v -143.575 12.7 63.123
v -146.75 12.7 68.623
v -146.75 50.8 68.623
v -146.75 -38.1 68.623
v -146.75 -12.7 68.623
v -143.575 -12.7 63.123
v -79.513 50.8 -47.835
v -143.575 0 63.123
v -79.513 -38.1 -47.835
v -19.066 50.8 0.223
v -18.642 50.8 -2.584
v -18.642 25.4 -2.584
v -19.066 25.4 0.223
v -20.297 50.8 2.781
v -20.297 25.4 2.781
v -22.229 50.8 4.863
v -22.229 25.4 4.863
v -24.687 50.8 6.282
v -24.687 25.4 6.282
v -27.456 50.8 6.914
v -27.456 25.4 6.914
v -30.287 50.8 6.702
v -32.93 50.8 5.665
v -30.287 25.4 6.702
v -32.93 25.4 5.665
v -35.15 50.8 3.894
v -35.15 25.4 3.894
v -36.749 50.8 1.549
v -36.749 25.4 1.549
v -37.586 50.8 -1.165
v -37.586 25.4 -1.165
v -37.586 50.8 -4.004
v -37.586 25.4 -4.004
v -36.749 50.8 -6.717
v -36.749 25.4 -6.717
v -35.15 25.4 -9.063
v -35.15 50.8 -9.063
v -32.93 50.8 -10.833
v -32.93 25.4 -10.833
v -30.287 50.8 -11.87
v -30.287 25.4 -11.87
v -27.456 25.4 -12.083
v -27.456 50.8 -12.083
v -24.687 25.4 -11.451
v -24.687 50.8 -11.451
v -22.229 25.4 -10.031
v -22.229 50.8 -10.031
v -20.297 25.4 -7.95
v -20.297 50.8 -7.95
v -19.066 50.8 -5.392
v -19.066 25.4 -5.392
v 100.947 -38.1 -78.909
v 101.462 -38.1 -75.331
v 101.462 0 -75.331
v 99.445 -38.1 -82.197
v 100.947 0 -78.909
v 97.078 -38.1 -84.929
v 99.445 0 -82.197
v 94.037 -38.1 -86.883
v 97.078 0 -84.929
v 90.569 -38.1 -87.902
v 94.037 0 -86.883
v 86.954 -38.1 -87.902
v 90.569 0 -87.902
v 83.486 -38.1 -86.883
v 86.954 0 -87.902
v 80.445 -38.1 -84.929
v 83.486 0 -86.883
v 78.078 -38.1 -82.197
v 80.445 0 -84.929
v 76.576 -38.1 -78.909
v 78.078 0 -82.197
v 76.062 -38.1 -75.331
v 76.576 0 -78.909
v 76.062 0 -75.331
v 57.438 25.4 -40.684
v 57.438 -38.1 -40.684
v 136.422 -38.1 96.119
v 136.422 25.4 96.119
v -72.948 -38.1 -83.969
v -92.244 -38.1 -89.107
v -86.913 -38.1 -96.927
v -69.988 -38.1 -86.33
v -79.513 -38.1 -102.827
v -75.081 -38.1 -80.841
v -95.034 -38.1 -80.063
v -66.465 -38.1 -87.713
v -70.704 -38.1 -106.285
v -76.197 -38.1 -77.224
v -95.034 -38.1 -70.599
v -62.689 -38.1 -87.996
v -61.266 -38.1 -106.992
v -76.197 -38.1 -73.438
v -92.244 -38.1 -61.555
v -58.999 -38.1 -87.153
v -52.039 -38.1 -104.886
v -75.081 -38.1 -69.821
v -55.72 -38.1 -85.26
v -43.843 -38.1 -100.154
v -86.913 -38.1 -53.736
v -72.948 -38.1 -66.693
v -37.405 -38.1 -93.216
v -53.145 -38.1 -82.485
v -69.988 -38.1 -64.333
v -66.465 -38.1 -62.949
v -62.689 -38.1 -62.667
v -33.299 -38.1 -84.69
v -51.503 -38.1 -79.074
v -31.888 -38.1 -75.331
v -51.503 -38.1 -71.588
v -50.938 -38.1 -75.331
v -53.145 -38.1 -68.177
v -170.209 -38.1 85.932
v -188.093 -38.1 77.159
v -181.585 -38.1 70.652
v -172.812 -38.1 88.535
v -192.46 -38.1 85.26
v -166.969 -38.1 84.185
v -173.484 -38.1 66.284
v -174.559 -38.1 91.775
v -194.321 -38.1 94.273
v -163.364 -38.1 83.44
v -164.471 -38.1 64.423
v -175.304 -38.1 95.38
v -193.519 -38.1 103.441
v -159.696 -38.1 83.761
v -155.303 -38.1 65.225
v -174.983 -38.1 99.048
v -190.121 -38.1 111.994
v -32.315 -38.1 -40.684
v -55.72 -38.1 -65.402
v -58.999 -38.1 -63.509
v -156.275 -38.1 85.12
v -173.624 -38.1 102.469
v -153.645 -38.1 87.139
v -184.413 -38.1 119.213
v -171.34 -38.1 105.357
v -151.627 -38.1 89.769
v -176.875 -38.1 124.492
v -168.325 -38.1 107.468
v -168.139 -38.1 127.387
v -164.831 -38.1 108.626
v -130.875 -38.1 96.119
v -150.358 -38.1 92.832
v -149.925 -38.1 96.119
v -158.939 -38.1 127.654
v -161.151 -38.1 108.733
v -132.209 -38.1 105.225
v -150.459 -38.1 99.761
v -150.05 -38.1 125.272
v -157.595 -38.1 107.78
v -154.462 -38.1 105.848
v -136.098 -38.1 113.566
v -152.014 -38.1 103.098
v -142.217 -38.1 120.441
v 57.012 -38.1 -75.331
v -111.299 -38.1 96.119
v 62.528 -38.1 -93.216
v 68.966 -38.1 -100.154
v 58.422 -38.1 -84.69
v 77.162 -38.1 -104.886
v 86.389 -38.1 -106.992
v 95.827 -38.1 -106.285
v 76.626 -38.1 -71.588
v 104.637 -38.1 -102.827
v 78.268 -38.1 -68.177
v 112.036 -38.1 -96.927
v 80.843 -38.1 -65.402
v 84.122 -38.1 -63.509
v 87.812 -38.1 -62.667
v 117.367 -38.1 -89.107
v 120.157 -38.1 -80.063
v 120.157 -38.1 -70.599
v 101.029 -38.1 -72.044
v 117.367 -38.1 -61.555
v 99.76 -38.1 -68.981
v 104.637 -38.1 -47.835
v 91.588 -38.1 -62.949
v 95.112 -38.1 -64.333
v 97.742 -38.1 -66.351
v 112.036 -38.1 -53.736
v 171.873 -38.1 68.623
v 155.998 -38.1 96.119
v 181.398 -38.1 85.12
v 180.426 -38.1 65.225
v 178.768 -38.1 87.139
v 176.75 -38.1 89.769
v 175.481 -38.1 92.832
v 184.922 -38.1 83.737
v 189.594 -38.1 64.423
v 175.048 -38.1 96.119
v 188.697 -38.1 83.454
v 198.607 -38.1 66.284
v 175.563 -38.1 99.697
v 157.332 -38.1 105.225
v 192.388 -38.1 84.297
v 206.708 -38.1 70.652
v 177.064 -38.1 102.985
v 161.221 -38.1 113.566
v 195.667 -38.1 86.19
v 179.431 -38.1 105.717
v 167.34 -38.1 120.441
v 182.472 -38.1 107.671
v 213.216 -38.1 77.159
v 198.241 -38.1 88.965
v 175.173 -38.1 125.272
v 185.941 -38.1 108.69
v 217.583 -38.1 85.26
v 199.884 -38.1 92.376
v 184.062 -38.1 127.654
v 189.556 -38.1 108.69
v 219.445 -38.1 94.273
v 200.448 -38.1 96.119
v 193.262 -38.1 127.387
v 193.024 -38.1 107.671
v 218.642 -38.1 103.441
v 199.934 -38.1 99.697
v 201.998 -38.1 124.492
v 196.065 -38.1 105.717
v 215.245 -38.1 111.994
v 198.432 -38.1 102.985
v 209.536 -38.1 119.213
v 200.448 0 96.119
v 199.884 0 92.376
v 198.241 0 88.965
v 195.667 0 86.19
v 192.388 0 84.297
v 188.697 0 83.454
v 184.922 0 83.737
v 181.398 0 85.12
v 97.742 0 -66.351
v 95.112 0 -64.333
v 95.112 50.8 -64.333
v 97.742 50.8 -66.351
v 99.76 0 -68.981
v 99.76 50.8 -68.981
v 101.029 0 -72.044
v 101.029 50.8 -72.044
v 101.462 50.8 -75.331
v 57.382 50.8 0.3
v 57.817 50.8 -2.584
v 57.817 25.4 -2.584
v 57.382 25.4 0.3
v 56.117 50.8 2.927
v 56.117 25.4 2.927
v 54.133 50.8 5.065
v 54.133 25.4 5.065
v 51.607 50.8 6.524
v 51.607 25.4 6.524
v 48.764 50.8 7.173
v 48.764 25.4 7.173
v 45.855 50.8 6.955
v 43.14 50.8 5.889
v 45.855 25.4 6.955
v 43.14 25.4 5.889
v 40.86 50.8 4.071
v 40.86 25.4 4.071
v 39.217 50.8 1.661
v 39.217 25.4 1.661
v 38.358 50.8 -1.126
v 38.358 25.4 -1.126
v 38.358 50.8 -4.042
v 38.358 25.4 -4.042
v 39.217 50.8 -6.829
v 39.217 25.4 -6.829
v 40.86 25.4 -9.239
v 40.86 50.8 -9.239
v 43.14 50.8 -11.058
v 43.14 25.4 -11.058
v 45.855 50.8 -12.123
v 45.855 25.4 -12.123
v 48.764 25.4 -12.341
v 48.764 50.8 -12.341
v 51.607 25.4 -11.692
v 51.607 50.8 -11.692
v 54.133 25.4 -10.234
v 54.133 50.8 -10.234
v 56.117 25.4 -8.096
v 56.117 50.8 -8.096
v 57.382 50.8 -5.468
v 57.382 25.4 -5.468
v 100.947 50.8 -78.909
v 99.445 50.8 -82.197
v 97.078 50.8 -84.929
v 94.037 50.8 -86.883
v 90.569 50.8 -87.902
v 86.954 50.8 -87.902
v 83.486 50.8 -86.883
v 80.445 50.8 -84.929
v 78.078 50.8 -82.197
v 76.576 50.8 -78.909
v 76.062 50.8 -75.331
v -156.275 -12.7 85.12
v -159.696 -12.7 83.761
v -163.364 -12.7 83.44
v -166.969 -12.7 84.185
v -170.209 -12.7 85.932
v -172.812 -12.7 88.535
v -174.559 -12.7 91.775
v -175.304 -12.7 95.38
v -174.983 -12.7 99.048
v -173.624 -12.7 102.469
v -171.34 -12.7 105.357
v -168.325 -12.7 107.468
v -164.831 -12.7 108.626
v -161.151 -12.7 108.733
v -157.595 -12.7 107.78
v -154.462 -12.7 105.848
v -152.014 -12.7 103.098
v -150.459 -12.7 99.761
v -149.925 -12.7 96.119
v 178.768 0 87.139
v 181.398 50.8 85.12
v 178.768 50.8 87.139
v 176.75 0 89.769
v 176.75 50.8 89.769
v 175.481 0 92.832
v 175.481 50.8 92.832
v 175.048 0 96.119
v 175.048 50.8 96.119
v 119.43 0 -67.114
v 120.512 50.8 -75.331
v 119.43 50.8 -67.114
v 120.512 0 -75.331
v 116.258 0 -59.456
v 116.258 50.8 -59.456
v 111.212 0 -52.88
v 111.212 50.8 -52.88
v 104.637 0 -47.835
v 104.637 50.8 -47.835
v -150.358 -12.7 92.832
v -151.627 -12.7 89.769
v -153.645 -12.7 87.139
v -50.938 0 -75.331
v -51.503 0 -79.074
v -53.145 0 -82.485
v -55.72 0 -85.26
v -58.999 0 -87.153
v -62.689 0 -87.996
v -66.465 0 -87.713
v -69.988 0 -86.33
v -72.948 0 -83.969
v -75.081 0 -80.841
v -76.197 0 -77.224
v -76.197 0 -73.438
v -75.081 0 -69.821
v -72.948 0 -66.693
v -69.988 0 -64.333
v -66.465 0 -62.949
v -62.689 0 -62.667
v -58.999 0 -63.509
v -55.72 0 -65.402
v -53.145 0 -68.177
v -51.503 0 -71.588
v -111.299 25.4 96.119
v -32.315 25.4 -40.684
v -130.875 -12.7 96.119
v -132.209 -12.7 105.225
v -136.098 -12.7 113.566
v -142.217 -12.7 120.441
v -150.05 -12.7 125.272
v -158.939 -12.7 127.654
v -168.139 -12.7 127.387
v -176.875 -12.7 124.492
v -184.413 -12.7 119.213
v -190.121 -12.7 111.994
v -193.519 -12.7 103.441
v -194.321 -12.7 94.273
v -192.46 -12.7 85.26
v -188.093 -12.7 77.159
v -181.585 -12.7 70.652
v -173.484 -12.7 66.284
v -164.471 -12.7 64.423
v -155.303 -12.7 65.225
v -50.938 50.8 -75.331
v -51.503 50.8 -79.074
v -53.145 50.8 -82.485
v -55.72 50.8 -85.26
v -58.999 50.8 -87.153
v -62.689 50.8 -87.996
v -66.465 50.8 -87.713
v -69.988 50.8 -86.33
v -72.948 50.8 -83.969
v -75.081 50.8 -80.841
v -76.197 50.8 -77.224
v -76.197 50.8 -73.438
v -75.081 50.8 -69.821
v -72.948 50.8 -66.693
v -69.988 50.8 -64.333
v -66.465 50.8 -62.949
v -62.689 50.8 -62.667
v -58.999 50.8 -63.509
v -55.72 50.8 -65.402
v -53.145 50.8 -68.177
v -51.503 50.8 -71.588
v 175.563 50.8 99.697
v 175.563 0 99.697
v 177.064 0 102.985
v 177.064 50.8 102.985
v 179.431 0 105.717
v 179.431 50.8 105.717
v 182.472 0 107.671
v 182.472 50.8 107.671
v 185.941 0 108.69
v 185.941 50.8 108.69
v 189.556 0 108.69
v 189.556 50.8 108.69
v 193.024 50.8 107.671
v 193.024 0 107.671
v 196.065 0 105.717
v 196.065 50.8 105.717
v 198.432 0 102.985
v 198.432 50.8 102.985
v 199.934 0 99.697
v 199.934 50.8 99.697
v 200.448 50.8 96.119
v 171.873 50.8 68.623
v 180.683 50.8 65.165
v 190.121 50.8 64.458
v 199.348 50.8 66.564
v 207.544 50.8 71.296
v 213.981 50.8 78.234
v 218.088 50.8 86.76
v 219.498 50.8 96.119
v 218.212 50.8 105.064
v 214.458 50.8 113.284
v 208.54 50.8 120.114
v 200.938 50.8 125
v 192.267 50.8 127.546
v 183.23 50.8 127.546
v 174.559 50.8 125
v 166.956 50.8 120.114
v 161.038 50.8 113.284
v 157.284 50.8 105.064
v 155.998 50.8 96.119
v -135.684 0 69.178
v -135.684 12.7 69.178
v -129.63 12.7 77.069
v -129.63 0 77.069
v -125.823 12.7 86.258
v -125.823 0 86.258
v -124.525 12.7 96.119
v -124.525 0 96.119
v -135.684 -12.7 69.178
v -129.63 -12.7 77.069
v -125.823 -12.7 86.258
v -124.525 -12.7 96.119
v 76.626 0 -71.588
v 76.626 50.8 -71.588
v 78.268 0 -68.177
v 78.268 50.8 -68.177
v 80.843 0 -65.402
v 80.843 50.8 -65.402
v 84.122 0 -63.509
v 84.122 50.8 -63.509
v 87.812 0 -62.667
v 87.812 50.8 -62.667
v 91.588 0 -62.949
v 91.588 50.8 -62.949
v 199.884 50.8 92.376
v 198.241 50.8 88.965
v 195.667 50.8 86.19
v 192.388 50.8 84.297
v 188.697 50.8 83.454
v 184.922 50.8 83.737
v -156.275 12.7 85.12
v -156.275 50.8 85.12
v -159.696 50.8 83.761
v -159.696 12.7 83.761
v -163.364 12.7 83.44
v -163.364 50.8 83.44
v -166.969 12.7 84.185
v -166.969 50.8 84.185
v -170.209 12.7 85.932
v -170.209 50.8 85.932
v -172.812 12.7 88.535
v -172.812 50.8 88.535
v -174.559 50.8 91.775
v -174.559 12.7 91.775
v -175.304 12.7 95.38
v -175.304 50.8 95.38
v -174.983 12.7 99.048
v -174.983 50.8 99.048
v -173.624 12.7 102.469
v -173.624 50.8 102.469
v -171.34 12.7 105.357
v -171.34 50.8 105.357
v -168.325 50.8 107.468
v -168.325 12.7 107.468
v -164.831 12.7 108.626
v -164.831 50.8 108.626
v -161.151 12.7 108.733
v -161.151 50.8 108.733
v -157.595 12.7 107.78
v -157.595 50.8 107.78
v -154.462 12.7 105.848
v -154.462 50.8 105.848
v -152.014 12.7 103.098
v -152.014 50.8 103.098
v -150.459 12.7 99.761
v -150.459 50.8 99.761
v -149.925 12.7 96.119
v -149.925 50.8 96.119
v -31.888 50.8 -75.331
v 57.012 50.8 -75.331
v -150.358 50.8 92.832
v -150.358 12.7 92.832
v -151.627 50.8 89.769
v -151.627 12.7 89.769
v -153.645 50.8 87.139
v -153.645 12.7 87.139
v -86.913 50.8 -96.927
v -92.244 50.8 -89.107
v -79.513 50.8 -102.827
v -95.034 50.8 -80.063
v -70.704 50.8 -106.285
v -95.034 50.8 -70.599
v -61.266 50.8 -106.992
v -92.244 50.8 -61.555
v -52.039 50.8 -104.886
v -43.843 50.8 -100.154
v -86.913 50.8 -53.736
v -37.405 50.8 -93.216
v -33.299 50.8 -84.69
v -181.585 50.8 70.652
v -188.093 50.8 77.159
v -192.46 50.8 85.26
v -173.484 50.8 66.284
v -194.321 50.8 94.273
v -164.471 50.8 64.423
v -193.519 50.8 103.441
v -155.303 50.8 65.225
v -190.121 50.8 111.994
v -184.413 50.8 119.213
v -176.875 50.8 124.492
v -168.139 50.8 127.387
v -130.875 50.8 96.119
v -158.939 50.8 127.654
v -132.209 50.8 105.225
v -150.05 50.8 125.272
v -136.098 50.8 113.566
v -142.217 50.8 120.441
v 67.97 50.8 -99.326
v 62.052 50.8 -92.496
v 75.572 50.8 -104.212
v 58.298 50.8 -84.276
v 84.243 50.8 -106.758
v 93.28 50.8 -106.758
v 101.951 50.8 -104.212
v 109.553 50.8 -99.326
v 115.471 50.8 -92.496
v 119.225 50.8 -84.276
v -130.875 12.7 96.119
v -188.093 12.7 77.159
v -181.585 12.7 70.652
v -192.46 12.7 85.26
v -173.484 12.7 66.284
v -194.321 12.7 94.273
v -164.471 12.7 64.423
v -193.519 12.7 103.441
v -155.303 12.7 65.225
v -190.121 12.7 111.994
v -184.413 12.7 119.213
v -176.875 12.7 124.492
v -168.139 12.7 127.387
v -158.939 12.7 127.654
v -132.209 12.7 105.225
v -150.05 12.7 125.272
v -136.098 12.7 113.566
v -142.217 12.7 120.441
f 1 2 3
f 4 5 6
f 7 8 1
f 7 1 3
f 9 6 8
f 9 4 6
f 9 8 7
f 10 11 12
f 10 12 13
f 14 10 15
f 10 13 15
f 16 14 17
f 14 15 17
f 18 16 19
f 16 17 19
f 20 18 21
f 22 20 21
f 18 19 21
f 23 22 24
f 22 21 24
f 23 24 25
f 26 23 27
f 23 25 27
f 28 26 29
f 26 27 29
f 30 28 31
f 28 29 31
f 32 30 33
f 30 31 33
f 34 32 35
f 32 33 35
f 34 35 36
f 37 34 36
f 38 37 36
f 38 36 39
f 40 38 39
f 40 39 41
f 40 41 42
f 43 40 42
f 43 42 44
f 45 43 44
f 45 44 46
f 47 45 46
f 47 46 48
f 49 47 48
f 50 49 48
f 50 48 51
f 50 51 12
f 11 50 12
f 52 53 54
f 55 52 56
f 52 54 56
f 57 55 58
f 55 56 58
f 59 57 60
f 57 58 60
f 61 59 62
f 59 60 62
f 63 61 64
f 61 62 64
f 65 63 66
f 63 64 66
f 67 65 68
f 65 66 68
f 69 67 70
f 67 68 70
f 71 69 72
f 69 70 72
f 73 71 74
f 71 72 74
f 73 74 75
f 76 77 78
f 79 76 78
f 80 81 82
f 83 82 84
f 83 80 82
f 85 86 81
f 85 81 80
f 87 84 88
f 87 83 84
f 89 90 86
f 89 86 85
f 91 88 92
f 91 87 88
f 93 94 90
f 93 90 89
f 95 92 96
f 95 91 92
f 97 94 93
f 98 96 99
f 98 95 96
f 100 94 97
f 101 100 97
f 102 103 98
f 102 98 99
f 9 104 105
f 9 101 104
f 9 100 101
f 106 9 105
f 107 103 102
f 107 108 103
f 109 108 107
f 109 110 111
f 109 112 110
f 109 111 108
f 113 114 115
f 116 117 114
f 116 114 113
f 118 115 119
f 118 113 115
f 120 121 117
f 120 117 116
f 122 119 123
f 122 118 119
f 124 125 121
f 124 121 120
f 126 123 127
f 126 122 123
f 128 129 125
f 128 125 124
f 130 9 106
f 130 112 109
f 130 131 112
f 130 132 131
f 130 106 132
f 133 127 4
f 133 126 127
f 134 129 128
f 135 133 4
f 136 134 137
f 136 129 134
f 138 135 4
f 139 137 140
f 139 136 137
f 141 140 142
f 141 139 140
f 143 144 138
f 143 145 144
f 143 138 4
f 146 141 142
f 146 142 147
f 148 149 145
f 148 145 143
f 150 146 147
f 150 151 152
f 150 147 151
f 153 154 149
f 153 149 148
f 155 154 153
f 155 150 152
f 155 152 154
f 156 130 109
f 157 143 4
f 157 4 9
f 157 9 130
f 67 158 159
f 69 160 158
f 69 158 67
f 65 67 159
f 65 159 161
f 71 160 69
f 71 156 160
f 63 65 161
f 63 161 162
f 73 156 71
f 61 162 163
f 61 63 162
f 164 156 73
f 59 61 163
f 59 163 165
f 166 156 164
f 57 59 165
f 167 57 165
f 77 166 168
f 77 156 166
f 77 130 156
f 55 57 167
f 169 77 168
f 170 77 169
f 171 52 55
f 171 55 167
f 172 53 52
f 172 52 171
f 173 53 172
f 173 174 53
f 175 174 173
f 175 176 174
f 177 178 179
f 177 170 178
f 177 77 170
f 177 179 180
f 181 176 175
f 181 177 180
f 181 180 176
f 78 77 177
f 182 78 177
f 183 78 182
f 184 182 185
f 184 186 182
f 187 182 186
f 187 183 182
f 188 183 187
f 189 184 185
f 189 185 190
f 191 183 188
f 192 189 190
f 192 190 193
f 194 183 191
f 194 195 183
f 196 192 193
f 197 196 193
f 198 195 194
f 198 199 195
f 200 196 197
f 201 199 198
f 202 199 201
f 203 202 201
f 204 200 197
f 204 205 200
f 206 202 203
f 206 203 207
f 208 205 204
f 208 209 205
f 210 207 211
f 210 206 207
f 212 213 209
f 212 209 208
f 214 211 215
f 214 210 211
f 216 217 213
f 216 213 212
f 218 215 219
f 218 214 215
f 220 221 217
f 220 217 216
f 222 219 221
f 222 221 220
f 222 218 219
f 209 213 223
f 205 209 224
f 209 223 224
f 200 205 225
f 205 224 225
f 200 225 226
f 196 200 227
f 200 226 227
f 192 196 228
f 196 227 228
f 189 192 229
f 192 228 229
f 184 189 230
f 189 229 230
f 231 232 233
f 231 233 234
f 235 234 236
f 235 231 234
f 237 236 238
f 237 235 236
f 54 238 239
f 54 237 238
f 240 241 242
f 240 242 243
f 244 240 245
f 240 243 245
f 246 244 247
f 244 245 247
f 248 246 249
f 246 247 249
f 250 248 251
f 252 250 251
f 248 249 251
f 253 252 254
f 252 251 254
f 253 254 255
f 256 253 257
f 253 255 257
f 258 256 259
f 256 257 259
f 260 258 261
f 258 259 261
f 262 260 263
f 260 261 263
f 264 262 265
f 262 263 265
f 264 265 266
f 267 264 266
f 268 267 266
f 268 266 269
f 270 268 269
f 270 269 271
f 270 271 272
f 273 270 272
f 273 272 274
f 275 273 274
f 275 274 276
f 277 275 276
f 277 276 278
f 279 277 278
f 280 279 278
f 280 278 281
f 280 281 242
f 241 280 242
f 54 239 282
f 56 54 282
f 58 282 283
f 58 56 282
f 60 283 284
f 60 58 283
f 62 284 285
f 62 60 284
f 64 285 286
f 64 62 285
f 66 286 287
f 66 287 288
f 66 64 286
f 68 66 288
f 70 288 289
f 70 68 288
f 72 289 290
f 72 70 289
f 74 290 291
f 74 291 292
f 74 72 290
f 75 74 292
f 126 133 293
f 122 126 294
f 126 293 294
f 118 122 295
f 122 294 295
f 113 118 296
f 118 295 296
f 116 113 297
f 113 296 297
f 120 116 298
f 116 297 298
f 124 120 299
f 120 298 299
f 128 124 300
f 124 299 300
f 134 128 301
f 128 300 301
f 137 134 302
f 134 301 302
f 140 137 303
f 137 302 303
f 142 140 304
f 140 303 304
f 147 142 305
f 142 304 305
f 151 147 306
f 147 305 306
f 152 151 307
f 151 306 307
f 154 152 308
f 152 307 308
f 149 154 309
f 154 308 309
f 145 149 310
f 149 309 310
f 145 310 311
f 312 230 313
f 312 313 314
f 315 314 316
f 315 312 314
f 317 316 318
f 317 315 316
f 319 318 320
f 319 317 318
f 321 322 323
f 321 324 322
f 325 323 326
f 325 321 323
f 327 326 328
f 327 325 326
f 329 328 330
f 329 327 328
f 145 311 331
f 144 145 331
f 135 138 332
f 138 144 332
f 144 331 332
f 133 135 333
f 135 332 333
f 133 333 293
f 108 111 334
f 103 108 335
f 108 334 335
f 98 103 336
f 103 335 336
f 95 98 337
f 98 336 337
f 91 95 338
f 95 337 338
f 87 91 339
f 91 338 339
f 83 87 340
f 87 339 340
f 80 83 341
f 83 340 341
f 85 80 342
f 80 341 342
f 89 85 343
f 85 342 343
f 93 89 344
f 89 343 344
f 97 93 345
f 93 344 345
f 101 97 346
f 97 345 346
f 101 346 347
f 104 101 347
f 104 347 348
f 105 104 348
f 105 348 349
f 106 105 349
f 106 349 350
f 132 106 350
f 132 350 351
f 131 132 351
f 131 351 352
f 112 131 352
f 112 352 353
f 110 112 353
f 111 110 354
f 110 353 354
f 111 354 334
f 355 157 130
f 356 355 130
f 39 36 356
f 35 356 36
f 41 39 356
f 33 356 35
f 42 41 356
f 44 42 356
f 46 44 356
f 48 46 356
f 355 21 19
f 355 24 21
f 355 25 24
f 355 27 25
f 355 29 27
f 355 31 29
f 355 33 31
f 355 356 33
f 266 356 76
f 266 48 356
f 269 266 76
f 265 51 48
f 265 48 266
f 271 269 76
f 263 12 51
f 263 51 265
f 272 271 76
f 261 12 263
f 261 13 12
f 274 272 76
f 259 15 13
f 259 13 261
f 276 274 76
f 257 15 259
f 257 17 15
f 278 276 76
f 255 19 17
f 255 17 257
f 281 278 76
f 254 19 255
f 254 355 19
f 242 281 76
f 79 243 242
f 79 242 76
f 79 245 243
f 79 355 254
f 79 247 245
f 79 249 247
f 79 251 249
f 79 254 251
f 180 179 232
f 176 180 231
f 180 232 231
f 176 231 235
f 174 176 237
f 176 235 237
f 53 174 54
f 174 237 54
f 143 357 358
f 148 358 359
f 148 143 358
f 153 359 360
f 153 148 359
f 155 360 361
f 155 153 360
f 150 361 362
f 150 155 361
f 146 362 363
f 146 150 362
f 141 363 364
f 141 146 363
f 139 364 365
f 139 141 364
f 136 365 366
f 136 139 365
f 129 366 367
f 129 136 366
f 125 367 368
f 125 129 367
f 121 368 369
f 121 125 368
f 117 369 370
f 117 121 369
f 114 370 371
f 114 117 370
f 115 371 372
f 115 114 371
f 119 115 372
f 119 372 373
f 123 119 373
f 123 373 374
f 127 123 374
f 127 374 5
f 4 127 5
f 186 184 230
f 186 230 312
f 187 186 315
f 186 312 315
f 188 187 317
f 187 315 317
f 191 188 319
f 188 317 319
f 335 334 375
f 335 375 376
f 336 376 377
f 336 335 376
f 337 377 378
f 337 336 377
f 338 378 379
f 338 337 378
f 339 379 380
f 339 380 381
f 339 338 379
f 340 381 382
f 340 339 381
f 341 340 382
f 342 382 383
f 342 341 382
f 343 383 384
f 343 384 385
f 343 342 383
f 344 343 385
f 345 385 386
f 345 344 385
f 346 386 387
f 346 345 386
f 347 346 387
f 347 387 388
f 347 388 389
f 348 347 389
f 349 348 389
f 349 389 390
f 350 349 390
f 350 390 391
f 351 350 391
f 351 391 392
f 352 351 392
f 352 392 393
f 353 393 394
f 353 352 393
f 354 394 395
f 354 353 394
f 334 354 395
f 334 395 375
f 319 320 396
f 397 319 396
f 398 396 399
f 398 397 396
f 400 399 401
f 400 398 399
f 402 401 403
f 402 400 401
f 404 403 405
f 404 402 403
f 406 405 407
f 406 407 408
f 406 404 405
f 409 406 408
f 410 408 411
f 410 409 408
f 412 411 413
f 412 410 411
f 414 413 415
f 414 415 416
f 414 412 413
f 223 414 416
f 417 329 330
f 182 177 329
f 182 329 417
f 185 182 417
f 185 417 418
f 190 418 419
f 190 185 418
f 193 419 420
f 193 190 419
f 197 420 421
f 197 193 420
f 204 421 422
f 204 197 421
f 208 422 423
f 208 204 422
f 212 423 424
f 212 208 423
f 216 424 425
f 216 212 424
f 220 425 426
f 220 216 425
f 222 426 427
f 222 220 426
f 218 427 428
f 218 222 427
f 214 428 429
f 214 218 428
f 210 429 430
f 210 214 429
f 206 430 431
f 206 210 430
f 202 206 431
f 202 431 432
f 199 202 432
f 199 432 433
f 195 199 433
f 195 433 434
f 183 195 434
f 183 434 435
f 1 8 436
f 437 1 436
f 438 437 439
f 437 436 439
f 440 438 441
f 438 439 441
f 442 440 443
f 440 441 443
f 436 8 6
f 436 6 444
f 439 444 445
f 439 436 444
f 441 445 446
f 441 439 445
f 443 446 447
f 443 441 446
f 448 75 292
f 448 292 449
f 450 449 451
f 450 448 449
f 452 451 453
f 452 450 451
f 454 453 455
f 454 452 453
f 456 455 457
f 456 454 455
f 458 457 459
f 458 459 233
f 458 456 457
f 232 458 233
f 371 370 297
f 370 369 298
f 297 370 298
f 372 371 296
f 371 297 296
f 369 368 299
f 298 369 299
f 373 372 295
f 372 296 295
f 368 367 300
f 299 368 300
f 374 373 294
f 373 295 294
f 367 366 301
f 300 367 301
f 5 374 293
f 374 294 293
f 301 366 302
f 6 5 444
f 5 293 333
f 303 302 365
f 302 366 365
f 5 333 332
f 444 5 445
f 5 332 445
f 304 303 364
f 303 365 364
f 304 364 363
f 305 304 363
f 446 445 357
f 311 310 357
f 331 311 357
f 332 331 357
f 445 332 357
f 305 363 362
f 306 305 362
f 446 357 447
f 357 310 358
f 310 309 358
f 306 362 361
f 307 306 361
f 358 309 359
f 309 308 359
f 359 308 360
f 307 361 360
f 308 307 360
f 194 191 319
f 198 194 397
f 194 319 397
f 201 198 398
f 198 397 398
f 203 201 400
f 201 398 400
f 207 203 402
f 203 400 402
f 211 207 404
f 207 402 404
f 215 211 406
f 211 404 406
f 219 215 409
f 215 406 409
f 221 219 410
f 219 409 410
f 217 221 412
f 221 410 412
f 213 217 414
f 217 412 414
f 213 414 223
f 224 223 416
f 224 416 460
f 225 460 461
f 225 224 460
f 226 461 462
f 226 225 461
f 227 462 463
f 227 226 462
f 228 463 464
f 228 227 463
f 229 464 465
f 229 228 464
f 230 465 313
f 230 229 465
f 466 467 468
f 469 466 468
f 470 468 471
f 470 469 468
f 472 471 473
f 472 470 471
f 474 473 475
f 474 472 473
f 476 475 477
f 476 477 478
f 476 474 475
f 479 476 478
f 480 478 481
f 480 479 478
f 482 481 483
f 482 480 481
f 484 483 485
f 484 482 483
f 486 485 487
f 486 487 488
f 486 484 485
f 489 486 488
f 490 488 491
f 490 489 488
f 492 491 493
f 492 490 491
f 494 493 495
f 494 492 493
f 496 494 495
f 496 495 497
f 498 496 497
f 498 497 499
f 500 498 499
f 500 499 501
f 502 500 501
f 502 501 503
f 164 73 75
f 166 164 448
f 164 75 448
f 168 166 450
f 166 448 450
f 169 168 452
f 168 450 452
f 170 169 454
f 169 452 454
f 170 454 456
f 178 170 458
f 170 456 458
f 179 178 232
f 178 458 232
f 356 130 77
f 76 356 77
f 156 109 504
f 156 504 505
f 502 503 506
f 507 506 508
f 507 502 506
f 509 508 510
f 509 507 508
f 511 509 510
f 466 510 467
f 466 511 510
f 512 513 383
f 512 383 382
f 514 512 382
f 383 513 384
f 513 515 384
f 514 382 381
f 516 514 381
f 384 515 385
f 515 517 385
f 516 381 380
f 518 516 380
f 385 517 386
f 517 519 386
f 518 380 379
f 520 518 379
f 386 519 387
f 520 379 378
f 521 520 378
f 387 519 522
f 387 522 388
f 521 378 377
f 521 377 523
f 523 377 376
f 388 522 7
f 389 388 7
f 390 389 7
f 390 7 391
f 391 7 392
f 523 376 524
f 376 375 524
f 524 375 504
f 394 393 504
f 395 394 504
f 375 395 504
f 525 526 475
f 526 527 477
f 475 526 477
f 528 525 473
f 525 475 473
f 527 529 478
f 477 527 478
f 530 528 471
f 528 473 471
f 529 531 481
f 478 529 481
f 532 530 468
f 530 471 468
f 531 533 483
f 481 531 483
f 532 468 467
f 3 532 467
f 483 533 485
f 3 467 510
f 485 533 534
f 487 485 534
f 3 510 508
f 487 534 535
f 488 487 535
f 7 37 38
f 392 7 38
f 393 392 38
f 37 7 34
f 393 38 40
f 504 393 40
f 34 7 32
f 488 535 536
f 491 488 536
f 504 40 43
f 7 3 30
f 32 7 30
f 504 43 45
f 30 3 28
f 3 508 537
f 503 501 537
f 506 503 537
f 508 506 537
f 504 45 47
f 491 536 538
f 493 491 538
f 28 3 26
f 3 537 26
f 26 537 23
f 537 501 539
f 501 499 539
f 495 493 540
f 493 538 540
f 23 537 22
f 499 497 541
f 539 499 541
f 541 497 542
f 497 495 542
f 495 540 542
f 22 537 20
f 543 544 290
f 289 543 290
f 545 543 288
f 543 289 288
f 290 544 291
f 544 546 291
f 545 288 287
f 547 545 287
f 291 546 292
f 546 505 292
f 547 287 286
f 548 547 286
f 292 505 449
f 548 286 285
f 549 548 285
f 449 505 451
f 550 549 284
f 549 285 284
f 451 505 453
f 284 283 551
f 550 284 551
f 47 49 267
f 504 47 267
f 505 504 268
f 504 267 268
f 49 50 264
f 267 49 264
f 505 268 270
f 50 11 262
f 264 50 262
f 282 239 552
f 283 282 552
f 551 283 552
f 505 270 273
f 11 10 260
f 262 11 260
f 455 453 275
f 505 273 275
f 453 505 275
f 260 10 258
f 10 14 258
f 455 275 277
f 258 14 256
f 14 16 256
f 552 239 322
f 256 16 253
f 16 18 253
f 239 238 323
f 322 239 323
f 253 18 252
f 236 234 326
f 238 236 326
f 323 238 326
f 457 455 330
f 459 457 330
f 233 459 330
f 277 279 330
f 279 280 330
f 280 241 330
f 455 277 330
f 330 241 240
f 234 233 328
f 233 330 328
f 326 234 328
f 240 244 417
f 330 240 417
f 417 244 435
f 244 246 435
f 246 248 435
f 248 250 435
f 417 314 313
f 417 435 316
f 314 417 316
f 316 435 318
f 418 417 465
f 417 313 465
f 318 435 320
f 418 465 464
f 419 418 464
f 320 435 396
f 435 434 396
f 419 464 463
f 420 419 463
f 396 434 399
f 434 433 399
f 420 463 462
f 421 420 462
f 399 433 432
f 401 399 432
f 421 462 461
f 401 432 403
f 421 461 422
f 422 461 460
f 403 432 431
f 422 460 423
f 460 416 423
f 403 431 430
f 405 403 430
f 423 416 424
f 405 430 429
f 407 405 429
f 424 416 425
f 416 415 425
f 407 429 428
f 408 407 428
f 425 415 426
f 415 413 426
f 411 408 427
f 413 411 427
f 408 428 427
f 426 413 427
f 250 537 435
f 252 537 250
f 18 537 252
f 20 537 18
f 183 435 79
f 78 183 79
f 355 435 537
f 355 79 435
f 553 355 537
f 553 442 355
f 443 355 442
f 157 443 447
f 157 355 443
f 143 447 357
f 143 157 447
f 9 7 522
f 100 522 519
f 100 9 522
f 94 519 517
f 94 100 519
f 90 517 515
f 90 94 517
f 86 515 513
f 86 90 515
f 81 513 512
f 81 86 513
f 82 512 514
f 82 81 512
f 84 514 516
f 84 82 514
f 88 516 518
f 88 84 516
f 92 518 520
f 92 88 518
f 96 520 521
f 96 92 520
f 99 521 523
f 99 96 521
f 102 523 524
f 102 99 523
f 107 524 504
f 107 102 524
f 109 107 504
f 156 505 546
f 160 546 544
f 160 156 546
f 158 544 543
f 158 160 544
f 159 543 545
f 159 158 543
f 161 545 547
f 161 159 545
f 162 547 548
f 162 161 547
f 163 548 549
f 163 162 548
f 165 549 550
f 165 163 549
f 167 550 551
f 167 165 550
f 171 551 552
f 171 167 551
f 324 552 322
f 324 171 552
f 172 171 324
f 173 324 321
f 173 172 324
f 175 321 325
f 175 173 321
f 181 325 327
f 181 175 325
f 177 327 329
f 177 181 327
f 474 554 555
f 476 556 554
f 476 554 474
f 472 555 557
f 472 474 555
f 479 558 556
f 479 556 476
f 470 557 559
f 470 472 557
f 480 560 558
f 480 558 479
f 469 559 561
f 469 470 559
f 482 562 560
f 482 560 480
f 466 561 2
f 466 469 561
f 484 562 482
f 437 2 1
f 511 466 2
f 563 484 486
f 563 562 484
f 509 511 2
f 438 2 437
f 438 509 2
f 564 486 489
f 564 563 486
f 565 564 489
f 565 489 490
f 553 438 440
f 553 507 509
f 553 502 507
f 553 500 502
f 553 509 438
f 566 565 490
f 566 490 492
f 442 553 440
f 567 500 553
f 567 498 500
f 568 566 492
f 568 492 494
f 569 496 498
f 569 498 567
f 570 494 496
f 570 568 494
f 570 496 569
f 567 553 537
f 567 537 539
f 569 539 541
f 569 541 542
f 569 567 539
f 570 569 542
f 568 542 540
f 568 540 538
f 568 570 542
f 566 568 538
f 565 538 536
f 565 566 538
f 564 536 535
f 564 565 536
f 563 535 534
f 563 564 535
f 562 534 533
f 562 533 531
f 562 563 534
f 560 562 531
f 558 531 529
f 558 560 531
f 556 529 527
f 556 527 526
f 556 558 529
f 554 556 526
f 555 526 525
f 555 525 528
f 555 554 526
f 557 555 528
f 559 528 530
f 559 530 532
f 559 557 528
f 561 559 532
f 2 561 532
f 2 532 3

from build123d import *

# Parameters (mm, degrees)
F1_DEPTH  = 50.8
F3_DEPTH  = 76.2
F4_R      = 38.1
F1_FACE_R = 12.7
F5_DEPTH  = 12.7
F6_R      = 9.525
F6_R_2    = 9.7843029872
F7_DEPTH  = 25.401


with BuildPart() as f1:
    # F0 (on Front) → F1 (new body, symmetric)
    with BuildSketch(Plane.XZ):
        with BuildLine():
            ThreePointArc((-130.8751894546, 96.1189323328), (-190.1214960247, 111.9939323328), (-146.7501894546, 68.6226257627))
            Line((-146.7501894546, 68.6226257627), (-156.2751894546, 85.1204097048))
            ThreePointArc((-156.2751894546, 85.1204097048), (-173.6237120826, 102.4689323328), (-149.9251894546, 96.1189323328))
            Line((-149.9251894546, 96.1189323328), (-130.8751894546, 96.1189323328))
        make_face()
        with BuildLine():
            Line((-156.2751894546, 85.1204097048), (-146.7501894546, 68.6226257627))
            ThreePointArc((-146.7501894546, 68.6226257627), (-135.1288828844, 80.2439323328), (-130.8751894546, 96.1189323328))
            Line((-130.8751894546, 96.1189323328), (-149.9251894546, 96.1189323328))
            ThreePointArc((-149.9251894546, 96.1189323328), (-151.6266668265, 89.7689323328), (-156.2751894546, 85.1204097048))
        make_face()
        with BuildLine():
            Line((181.3982178505, 85.1204097048), (171.8732178505, 68.6226257627))
            ThreePointArc((171.8732178505, 68.6226257627), (203.6232178505, 68.6226257627), (219.4982178505, 96.1189323328))
            ThreePointArc((219.4982178505, 96.1189323328), (187.7482178505, 127.8689323328), (155.9982178505, 96.1189323328))
            Line((155.9982178505, 96.1189323328), (175.0482178505, 96.1189323328))
            ThreePointArc((175.0482178505, 96.1189323328), (187.7482178505, 108.8189323328), (200.4482178505, 96.1189323328))
            ThreePointArc((200.4482178505, 96.1189323328), (194.0982178505, 85.1204097048), (181.3982178505, 85.1204097048))
        make_face()
        with BuildLine():
            ThreePointArc((-79.513485802, -47.834761097), (-47.763485802, -47.834761097), (-31.888485802, -75.3310676672))
            Line((-31.888485802, -75.3310676672), (57.011514198, -75.3310676672))
            ThreePointArc((57.011514198, -75.3310676672), (72.886514198, -47.834761097), (104.636514198, -47.834761097))
            Line((104.636514198, -47.834761097), (171.8732178505, 68.6226257627))
            ThreePointArc((171.8732178505, 68.6226257627), (160.2519112804, 80.2439323328), (155.9982178505, 96.1189323328))
            Line((155.9982178505, 96.1189323328), (-130.8751894546, 96.1189323328))
            ThreePointArc((-130.8751894546, 96.1189323328), (-135.1288828844, 80.2439323328), (-146.7501894546, 68.6226257627))
            Line((-146.7501894546, 68.6226257627), (-79.513485802, -47.834761097))
        make_face()
        with BuildLine():
            Line((76.061514198, -75.3310676672), (57.011514198, -75.3310676672))
            ThreePointArc((57.011514198, -75.3310676672), (88.761514198, -107.0810676672), (120.511514198, -75.3310676672))
            ThreePointArc((120.511514198, -75.3310676672), (116.2578207681, -59.4560676672), (104.636514198, -47.834761097))
            Line((104.636514198, -47.834761097), (95.111514198, -64.3325450391))
            ThreePointArc((95.111514198, -64.3325450391), (99.760036826, -68.9810676672), (101.461514198, -75.3310676672))
            ThreePointArc((101.461514198, -75.3310676672), (88.761514198, -88.0310676672), (76.061514198, -75.3310676672))
        make_face()
        with BuildLine():
            ThreePointArc((104.636514198, -47.834761097), (72.886514198, -47.834761097), (57.011514198, -75.3310676672))
            Line((57.011514198, -75.3310676672), (76.061514198, -75.3310676672))
            ThreePointArc((76.061514198, -75.3310676672), (82.411514198, -64.3325450391), (95.111514198, -64.3325450391))
            Line((95.111514198, -64.3325450391), (104.636514198, -47.834761097))
        make_face()
        with BuildLine():
            Line((-31.888485802, -75.3310676672), (-50.938485802, -75.3310676672))
            ThreePointArc((-50.938485802, -75.3310676672), (-69.988485802, -86.3295902952), (-69.988485802, -64.3325450391))
            Line((-69.988485802, -64.3325450391), (-79.513485802, -47.834761097))
            ThreePointArc((-79.513485802, -47.834761097), (-79.513485802, -102.8273742373), (-31.888485802, -75.3310676672))
        make_face()
        with BuildLine():
            ThreePointArc((-69.988485802, -64.3325450391), (-57.288485802, -64.3325450391), (-50.938485802, -75.3310676672))
            Line((-50.938485802, -75.3310676672), (-31.888485802, -75.3310676672))
            ThreePointArc((-31.888485802, -75.3310676672), (-47.763485802, -47.834761097), (-79.513485802, -47.834761097))
            Line((-79.513485802, -47.834761097), (-69.988485802, -64.3325450391))
        make_face()
        with BuildLine():
            ThreePointArc((155.9982178505, 96.1189323328), (160.2519112804, 80.2439323328), (171.8732178505, 68.6226257627))
            Line((171.8732178505, 68.6226257627), (181.3982178505, 85.1204097048))
            ThreePointArc((181.3982178505, 85.1204097048), (176.7496952225, 89.7689323328), (175.0482178505, 96.1189323328))
            Line((175.0482178505, 96.1189323328), (155.9982178505, 96.1189323328))
        make_face()
    extrude(amount=F1_DEPTH, both=True)

    # F2 (on face) → F3 (cut)
    with BuildSketch(Plane.XZ.offset(50.8)):
        Polygon((136.4217789196, 96.1189323328), (-111.2987505236, 96.1189323328), (-32.3154252183, -40.6842000468), (57.4384536142, -40.6842000468), align=None)
    extrude(amount=-F3_DEPTH, mode=Mode.SUBTRACT)

    # F4 (on Front) + F1_face (on face) → F5 (cut, symmetric)
    with BuildSketch(Plane.XZ):
        with Locations((-162.6251894546, 96.1189323328)):
            Circle(F4_R)
    with BuildSketch(Plane(origin=(12.561514198, -50.8, 21.3503423812), x_dir=(1, 0, 0), z_dir=(0, -1, 0))):
        with BuildLine():
            Line((-123.8602647216, 74.7685899517), (-143.4367036526, 74.7685899517))
            ThreePointArc((-143.4367036526, 74.7685899517), (-202.6830102227, 90.6435899517), (-159.3117036526, 47.2722833815))
            Line((-159.3117036526, 47.2722833815), (-92.075, -69.1851034782))
            ThreePointArc((-92.075, -69.1851034782), (-92.075, -124.1777166185), (-44.45, -96.6814100483))
            Line((-44.45, -96.6814100483), (44.45, -96.6814100483))
            ThreePointArc((44.45, -96.6814100483), (92.075, -124.1777166185), (92.075, -69.1851034782))
            Line((92.075, -69.1851034782), (159.3117036526, 47.2722833815))
            ThreePointArc((159.3117036526, 47.2722833815), (202.6830102227, 90.6435899517), (143.4367036526, 74.7685899517))
            Line((143.4367036526, 74.7685899517), (123.8602647216, 74.7685899517))
            Line((123.8602647216, 74.7685899517), (44.8769394163, -62.0345424279))
            Line((44.8769394163, -62.0345424279), (-44.8769394163, -62.0345424279))
            Line((-44.8769394163, -62.0345424279), (-123.8602647216, 74.7685899517))
        make_face()
        with Locations((-76.2, -96.6814100483)):
            Circle(F1_FACE_R, mode=Mode.SUBTRACT)
        with Locations((76.2, -96.6814100483)):
            Circle(F1_FACE_R, mode=Mode.SUBTRACT)
        with Locations((-175.1867036526, 74.7685899517)):
            Circle(F1_FACE_R, mode=Mode.SUBTRACT)
        with Locations((175.1867036526, 74.7685899517)):
            Circle(F1_FACE_R, mode=Mode.SUBTRACT)
    extrude(amount=F5_DEPTH, both=True, mode=Mode.SUBTRACT)

    # F6 (on face) → F7 (cut, through all)
    with BuildSketch(Plane.XZ.offset(-25.4)):
        with Locations((-28.1673731094, -2.5842000468)):
            Circle(F6_R)
        with Locations((48.0326268906, -2.5842000468)):
            Circle(F6_R_2)
    extrude(amount=-F7_DEPTH, mode=Mode.SUBTRACT)


solid = f1.part
